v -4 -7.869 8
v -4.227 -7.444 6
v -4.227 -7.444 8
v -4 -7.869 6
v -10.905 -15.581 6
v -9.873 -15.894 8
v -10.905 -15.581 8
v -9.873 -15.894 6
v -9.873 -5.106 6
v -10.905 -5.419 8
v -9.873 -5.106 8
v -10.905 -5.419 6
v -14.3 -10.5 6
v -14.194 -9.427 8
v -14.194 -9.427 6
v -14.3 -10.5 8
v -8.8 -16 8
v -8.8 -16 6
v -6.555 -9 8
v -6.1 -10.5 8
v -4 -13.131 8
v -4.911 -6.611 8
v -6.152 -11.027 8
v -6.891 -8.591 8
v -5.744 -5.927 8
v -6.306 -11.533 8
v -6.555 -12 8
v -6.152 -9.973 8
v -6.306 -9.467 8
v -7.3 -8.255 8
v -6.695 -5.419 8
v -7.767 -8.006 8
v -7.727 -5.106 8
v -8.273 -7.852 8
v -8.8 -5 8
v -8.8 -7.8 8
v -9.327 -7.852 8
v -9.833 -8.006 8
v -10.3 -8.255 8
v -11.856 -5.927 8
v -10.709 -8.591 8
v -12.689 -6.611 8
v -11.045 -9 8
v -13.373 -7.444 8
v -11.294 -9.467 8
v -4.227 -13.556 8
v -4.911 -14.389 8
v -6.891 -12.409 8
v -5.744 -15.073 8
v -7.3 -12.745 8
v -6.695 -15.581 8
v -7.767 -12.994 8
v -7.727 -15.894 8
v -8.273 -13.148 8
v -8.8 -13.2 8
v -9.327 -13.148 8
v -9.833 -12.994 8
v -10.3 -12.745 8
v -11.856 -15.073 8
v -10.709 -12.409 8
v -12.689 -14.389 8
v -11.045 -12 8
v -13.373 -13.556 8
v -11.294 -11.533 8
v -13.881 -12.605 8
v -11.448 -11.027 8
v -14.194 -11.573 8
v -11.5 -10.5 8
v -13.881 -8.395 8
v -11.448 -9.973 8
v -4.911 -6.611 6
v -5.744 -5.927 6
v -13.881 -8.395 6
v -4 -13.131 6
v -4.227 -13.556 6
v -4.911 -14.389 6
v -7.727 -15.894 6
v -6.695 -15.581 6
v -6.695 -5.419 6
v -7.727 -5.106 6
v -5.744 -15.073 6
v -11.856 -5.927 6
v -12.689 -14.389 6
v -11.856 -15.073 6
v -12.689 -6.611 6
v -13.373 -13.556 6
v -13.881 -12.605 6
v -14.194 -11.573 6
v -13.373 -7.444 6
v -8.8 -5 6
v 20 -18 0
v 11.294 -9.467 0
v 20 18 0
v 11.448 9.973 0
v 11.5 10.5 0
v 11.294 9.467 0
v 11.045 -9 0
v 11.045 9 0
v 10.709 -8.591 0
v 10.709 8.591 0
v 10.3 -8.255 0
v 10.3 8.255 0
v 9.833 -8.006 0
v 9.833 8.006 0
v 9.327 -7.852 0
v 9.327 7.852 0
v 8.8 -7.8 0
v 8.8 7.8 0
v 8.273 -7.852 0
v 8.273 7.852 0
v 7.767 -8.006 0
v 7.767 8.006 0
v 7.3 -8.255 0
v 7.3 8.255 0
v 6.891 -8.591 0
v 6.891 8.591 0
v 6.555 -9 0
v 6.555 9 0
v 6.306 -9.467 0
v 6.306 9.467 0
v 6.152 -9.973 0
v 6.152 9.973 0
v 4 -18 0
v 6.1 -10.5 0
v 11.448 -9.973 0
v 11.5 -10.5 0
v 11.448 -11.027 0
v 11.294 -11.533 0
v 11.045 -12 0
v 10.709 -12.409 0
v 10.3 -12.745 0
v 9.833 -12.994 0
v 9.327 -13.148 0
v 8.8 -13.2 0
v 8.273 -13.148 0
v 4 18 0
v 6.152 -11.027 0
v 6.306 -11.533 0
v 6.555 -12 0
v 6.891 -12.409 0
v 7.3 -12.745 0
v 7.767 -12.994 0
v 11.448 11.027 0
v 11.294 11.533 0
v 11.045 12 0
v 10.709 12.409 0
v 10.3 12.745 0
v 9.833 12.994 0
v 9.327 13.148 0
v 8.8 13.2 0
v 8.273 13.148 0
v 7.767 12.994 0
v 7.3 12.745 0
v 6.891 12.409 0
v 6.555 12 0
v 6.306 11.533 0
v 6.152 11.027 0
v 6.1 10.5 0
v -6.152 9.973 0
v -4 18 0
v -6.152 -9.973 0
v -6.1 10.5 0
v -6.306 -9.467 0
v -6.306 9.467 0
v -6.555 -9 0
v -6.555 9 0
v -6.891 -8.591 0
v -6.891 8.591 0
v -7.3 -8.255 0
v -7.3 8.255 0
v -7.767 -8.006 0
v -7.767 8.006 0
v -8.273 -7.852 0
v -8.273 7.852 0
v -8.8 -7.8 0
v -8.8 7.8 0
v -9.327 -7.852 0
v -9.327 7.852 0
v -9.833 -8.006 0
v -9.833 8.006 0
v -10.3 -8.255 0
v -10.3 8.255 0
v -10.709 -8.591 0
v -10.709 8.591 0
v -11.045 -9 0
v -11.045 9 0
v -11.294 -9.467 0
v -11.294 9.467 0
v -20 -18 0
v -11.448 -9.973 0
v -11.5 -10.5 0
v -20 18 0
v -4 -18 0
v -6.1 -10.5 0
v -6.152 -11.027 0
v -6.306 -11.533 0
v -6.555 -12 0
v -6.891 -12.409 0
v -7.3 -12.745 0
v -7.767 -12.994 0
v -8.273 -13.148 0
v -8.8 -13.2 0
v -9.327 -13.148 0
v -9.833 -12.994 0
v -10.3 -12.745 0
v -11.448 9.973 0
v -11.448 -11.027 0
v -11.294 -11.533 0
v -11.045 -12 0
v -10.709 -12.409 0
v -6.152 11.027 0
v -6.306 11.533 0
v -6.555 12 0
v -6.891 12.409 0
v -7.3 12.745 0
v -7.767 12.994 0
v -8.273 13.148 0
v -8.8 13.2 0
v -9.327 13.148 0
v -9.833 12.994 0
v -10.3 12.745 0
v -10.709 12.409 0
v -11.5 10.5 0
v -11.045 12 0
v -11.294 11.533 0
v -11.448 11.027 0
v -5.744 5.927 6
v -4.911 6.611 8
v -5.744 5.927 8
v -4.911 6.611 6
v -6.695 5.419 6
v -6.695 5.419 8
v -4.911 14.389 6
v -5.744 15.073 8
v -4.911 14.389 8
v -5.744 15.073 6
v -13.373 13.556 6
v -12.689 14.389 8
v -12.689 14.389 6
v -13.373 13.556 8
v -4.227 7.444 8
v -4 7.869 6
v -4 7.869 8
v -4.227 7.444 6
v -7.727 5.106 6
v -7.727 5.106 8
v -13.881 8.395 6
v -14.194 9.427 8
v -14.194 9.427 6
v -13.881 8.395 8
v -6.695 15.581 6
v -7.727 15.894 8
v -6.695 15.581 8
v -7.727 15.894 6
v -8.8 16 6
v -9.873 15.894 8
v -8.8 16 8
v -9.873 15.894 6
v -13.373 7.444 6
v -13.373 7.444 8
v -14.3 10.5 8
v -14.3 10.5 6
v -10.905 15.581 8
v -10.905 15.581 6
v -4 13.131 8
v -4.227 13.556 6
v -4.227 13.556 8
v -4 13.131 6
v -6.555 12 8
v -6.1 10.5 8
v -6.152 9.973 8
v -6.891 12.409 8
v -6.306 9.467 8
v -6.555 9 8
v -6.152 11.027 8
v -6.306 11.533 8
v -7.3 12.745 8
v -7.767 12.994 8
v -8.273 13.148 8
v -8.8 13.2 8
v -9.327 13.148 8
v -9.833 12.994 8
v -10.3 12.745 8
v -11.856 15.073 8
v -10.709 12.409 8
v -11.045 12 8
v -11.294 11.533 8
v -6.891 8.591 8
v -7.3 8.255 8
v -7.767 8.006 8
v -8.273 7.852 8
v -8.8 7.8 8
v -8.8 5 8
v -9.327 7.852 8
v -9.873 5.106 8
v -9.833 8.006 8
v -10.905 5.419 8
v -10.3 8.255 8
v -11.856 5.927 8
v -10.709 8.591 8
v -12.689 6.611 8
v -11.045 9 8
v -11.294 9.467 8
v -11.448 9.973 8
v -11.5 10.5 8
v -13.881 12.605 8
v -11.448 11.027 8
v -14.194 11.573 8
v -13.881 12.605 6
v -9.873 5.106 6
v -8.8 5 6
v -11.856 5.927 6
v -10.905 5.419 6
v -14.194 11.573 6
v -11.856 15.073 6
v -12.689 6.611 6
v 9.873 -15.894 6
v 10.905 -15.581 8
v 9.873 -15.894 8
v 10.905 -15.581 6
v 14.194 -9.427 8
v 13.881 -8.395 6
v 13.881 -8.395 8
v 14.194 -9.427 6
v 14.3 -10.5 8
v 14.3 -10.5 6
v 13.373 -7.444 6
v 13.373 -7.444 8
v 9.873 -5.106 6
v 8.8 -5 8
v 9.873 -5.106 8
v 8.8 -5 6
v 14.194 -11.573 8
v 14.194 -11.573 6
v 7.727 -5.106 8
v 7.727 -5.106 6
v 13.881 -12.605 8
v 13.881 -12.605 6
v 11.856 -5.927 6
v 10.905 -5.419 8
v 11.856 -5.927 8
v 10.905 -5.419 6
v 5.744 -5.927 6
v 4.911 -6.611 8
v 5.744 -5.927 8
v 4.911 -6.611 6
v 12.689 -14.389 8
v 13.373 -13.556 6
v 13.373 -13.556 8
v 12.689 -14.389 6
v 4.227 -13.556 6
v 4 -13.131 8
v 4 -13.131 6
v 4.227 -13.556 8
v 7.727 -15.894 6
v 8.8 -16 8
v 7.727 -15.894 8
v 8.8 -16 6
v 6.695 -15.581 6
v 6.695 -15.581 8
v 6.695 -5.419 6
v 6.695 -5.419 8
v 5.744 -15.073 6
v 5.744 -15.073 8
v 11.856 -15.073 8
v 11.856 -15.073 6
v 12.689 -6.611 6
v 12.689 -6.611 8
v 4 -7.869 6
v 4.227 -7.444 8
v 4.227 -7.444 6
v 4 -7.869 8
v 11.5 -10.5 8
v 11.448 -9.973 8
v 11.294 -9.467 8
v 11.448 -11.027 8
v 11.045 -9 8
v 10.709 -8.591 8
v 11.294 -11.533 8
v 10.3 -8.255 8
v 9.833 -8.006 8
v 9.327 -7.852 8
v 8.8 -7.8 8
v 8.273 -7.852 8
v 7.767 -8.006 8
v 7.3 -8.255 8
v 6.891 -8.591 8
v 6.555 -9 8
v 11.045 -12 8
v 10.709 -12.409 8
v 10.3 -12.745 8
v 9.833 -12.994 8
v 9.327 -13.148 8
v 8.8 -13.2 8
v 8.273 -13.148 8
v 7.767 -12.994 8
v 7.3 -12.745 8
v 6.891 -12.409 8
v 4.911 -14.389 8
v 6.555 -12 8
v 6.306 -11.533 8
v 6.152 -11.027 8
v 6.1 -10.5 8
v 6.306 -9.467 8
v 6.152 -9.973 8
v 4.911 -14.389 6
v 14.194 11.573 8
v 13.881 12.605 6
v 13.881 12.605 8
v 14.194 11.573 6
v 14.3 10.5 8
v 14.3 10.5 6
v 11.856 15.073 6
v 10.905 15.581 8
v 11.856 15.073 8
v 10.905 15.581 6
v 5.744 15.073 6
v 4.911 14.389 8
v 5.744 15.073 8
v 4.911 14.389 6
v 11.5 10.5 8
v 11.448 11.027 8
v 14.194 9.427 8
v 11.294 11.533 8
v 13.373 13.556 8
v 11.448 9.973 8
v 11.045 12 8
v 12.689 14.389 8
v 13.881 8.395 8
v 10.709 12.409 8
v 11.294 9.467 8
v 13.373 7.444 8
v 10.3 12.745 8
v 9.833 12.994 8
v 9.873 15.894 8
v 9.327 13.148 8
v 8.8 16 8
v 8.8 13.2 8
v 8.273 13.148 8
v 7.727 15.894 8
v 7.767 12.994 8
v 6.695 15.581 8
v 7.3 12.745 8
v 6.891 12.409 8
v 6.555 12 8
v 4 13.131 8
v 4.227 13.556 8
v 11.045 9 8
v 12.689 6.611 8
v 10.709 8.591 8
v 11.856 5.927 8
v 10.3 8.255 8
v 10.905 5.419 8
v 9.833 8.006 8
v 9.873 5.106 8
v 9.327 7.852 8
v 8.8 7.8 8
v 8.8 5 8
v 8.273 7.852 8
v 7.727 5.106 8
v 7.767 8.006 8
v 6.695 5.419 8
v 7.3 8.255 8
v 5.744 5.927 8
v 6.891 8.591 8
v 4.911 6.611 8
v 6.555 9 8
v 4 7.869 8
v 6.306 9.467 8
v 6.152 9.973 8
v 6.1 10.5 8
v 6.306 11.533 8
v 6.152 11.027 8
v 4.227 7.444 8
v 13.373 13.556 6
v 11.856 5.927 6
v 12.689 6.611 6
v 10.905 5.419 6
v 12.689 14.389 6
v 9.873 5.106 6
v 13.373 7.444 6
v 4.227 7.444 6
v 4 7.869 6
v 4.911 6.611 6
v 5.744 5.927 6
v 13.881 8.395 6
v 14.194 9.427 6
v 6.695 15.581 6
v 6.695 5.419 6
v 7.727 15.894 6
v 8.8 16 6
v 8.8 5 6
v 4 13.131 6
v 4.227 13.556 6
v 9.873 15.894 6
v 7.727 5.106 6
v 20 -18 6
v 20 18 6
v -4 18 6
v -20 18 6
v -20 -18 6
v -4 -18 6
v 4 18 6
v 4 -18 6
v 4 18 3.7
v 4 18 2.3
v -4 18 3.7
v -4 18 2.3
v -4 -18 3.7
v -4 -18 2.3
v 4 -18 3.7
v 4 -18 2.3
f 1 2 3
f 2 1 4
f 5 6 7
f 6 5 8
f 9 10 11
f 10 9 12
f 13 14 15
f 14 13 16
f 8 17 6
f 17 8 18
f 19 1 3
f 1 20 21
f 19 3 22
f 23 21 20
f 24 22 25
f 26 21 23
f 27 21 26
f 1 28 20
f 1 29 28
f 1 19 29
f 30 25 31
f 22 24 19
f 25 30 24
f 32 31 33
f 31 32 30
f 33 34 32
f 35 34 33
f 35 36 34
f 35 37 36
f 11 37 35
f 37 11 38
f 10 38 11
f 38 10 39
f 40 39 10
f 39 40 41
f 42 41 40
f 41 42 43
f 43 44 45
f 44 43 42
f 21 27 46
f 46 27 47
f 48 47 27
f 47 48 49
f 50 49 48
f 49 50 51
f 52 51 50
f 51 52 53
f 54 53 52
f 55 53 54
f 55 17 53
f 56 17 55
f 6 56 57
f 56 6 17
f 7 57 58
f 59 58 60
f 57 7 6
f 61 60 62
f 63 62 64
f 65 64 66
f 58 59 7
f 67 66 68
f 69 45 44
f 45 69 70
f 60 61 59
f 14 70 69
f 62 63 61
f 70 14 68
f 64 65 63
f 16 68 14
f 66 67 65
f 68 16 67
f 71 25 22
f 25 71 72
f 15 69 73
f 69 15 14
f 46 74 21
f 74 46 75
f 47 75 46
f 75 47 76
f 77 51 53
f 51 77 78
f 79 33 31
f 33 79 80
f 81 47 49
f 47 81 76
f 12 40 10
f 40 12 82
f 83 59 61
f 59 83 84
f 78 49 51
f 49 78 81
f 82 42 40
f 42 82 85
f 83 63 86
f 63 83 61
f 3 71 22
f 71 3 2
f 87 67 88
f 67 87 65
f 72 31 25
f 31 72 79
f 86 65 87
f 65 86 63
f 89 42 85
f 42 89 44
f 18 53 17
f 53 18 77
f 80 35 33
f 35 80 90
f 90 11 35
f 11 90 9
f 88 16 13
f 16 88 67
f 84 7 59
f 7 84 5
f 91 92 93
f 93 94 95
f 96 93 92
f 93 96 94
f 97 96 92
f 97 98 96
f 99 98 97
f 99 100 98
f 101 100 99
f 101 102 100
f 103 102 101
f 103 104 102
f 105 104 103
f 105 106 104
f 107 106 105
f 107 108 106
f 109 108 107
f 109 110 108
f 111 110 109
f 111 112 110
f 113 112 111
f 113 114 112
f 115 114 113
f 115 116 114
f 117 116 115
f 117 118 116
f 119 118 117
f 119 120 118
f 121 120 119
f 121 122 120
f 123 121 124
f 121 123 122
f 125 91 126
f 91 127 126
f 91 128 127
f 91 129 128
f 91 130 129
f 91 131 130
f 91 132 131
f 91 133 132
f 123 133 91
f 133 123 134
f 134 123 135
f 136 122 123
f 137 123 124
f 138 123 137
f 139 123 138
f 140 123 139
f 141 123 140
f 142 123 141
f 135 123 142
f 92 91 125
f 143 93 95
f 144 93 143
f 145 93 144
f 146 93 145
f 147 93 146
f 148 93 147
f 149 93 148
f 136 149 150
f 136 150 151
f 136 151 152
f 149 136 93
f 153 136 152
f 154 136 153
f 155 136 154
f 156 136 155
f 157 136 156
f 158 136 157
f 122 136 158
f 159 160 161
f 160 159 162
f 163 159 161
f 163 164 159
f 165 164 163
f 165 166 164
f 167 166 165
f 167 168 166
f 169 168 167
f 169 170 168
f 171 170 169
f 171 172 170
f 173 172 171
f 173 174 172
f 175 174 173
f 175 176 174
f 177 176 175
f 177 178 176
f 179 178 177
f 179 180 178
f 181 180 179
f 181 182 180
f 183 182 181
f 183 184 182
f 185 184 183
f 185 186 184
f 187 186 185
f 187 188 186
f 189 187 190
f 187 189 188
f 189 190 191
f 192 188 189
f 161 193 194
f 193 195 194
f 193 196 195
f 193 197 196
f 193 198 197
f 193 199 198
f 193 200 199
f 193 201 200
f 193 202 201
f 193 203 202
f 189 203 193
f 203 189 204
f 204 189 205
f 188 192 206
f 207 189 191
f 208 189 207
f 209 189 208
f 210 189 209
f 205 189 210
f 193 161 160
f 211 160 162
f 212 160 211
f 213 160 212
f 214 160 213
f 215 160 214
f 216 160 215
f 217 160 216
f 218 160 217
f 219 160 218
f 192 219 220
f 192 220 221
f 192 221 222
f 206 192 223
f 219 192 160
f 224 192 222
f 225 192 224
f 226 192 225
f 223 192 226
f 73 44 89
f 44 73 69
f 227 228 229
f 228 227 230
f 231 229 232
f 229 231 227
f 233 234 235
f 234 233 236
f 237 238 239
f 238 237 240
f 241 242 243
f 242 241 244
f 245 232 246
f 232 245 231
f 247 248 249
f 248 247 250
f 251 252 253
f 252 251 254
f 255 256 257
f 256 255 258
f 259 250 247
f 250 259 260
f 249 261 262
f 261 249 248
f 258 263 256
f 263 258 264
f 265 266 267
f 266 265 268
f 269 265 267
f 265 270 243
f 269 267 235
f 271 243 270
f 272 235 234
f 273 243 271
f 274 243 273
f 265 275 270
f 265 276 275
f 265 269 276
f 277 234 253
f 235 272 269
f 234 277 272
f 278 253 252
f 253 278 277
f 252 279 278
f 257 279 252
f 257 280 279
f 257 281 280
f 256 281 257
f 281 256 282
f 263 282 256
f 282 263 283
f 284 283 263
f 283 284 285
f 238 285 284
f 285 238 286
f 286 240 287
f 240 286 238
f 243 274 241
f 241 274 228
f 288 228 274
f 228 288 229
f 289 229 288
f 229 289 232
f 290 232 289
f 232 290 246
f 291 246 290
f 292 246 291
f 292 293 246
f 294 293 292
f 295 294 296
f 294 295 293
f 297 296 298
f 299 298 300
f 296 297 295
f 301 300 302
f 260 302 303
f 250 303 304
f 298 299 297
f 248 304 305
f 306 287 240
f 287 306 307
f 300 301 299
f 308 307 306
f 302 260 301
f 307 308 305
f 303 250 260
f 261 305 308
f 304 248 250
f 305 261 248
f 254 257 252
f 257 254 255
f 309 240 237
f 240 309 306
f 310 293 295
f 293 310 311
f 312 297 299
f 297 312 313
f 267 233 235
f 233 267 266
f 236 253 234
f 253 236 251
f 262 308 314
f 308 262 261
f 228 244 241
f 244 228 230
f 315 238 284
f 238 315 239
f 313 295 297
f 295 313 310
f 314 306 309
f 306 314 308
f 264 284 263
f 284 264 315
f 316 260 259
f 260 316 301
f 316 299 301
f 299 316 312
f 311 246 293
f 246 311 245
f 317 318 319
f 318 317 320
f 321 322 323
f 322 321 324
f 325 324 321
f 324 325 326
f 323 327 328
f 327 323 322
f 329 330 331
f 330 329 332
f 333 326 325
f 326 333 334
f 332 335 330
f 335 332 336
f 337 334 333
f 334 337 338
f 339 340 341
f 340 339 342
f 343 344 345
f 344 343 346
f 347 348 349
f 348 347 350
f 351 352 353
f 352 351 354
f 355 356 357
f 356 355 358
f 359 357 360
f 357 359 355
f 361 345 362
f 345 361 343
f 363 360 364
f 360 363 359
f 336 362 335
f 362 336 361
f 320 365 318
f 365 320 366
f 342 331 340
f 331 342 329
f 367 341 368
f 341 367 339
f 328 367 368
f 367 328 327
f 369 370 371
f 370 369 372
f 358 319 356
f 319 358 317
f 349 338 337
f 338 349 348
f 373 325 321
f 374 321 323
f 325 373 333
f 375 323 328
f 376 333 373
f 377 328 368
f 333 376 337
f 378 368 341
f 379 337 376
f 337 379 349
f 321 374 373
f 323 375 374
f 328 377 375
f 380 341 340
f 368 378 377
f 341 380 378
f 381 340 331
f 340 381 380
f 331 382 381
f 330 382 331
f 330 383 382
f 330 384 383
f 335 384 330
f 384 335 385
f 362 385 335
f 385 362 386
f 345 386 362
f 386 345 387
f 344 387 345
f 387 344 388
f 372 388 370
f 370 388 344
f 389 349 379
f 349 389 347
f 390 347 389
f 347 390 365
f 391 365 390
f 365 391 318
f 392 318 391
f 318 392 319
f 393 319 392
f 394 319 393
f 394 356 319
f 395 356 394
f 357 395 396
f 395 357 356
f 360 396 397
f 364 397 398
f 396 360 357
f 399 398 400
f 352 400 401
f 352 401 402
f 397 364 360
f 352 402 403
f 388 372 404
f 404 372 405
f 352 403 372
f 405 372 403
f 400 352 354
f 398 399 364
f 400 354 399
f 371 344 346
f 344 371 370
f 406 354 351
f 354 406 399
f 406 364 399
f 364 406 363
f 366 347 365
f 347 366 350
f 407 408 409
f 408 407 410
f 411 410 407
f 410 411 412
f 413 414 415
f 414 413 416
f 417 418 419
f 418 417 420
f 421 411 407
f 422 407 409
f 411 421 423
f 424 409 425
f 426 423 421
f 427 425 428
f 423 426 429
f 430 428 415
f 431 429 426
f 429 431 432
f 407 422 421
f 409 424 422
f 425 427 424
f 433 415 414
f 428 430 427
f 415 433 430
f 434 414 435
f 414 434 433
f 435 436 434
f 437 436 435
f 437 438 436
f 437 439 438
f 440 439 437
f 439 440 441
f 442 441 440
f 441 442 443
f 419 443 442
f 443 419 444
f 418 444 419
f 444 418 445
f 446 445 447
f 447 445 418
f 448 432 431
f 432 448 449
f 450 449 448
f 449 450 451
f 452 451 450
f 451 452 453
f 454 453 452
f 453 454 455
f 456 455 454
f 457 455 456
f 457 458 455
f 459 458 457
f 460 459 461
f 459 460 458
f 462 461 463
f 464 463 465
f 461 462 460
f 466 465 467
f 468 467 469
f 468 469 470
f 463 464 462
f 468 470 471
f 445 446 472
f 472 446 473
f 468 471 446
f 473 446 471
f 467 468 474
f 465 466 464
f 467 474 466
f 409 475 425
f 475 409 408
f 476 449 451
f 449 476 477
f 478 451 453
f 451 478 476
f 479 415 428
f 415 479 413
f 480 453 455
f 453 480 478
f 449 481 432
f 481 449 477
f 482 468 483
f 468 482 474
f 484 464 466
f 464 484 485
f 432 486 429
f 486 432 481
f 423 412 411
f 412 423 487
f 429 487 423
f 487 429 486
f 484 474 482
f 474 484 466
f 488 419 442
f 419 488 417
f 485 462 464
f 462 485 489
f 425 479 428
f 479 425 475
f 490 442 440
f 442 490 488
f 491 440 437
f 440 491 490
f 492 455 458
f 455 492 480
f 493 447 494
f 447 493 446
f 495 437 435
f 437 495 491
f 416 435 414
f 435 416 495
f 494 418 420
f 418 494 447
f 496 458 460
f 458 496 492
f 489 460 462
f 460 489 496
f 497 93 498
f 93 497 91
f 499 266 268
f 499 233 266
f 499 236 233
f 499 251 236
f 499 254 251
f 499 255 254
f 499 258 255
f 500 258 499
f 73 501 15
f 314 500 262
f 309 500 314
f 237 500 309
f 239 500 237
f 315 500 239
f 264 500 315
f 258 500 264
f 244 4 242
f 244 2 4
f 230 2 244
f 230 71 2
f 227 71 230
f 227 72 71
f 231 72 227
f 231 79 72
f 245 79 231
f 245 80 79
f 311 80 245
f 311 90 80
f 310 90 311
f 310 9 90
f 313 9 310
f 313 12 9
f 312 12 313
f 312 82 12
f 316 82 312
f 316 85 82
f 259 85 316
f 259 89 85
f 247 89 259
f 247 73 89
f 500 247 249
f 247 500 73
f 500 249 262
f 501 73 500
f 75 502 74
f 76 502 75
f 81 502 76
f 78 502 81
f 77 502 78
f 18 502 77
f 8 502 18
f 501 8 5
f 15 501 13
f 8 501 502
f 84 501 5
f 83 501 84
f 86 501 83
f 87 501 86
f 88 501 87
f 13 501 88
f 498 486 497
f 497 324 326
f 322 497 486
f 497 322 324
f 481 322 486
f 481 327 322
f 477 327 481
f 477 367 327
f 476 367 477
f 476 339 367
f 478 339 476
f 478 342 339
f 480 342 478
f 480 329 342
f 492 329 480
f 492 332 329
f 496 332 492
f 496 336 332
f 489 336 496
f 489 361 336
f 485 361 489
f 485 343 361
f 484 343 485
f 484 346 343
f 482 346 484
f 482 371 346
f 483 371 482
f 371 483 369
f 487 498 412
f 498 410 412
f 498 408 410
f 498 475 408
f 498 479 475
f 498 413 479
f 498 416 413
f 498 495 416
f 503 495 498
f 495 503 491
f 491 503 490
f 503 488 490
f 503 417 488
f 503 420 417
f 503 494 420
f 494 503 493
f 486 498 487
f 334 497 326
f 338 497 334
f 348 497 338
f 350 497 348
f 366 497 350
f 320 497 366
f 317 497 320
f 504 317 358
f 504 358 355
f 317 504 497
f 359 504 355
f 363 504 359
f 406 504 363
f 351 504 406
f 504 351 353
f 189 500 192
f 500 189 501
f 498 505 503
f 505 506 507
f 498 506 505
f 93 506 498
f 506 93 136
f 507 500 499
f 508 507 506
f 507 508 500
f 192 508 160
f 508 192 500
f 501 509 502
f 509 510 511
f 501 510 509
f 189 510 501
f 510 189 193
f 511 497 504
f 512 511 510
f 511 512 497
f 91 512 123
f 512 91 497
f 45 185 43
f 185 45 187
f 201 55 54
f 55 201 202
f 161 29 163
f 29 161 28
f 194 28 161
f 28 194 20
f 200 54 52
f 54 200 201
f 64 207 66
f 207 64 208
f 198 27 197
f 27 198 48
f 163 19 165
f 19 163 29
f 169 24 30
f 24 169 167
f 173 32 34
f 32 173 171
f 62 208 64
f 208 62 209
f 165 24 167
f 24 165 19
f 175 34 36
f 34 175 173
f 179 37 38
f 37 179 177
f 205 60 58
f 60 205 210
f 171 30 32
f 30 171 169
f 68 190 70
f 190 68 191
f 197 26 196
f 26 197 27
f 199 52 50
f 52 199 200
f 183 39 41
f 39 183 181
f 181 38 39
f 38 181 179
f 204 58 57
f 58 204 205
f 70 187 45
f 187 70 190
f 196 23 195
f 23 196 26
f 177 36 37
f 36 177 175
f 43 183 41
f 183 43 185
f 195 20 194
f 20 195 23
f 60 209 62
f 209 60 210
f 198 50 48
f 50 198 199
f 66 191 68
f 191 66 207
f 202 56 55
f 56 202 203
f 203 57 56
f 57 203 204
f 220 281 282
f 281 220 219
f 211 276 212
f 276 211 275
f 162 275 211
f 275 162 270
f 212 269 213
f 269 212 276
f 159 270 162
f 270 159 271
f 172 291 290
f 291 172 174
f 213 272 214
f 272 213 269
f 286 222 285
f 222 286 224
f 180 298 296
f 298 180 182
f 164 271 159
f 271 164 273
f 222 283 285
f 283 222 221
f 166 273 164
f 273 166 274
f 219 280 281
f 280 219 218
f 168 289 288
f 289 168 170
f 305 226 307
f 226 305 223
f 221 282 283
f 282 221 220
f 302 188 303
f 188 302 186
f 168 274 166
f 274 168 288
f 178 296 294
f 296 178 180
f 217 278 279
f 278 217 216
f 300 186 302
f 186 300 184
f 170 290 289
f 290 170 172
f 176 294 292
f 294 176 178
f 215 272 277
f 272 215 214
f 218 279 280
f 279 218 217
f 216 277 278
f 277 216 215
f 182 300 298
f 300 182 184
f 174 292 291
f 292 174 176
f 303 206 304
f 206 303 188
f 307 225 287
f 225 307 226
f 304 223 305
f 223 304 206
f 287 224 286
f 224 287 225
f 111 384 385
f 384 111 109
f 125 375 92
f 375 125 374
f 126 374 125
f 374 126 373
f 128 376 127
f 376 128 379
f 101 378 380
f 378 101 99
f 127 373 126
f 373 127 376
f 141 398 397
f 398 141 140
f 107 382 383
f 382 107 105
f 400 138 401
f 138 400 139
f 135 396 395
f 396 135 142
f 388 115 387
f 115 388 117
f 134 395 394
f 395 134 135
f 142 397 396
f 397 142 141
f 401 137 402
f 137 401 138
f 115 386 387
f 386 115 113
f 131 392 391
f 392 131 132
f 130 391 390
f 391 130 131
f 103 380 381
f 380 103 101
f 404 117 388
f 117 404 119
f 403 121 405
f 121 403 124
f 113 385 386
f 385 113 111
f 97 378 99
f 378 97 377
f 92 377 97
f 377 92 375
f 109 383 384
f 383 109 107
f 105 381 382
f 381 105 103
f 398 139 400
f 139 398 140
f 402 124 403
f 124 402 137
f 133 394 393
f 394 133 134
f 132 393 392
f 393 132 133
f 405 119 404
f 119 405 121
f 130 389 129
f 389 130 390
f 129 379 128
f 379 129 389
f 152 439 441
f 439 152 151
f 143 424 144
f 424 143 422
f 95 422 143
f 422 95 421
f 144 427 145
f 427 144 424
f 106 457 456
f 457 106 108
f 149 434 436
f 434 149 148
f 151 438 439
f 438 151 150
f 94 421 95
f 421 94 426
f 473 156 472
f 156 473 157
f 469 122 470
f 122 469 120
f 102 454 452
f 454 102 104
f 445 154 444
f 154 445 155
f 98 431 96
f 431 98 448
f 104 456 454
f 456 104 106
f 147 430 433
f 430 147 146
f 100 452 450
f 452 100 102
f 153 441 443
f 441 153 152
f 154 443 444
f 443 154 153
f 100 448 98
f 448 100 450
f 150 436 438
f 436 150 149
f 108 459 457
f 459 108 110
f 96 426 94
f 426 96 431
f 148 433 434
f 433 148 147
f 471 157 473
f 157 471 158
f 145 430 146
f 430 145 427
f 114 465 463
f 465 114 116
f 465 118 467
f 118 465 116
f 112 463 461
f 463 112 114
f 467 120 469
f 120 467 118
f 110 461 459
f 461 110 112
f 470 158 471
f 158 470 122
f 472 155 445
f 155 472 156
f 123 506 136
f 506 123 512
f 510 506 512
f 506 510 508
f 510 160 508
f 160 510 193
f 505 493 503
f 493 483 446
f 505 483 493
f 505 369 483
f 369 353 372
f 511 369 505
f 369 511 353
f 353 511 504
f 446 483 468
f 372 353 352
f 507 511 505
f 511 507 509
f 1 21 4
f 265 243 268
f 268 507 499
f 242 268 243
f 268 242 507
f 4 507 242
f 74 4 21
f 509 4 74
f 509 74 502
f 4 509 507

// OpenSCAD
$fn = 32;

// ----------------------------------------------------------------------
// Living hinge: 40 x 36 mm plates, 1.4 mm flexible web
// ----------------------------------------------------------------------

// --- parameters (mm) ---
plate_len = 16;           // plate length outside the web
plate_w = 36;             // plate width
thick = 6;                // plate thickness
web_half = 4;             // half width of the flex band
web_t = 1.4;              // flexible web thickness
web_z = 2.3;              // web position inside the thickness
boss_d = 11;              // screw boss diameter
boss_h = 8;               // screw boss height
boss_x = 8.8;             // screw boss distance from the web
screw_d = 5.4;            // screw hole

difference() {
  union() {
    /* one flat strip, later thinned at the middle */
    translate([-20, -18, 0]) cube([40, 36, 6]);
    /* screw bosses, sunk 0.5 mm into the plates */
    for (sx = [-8.8, 8.8]) {
      for (sy = [-10.5, 10.5]) {
        translate([sx, sy, 0]) cylinder(h = boss_h, d = boss_d);
      }
    }
  }
  /* channel from below: leaves the web on top of it */
  translate([-4, -20.5, -2.5]) cube([8, 41, 4.8]);
  /* channel from above: thins the web down to web_t */
  translate([-4, -20.5, 3.7]) cube([8, 41, 4.8]);
  /* screw holes through the bosses */
  for (sx = [-8.8, 8.8]) {
    for (sy = [-10.5, 10.5]) {
      translate([sx, sy, -2.5]) cylinder(h = boss_h + 5, d = screw_d);
    }
  }
}
